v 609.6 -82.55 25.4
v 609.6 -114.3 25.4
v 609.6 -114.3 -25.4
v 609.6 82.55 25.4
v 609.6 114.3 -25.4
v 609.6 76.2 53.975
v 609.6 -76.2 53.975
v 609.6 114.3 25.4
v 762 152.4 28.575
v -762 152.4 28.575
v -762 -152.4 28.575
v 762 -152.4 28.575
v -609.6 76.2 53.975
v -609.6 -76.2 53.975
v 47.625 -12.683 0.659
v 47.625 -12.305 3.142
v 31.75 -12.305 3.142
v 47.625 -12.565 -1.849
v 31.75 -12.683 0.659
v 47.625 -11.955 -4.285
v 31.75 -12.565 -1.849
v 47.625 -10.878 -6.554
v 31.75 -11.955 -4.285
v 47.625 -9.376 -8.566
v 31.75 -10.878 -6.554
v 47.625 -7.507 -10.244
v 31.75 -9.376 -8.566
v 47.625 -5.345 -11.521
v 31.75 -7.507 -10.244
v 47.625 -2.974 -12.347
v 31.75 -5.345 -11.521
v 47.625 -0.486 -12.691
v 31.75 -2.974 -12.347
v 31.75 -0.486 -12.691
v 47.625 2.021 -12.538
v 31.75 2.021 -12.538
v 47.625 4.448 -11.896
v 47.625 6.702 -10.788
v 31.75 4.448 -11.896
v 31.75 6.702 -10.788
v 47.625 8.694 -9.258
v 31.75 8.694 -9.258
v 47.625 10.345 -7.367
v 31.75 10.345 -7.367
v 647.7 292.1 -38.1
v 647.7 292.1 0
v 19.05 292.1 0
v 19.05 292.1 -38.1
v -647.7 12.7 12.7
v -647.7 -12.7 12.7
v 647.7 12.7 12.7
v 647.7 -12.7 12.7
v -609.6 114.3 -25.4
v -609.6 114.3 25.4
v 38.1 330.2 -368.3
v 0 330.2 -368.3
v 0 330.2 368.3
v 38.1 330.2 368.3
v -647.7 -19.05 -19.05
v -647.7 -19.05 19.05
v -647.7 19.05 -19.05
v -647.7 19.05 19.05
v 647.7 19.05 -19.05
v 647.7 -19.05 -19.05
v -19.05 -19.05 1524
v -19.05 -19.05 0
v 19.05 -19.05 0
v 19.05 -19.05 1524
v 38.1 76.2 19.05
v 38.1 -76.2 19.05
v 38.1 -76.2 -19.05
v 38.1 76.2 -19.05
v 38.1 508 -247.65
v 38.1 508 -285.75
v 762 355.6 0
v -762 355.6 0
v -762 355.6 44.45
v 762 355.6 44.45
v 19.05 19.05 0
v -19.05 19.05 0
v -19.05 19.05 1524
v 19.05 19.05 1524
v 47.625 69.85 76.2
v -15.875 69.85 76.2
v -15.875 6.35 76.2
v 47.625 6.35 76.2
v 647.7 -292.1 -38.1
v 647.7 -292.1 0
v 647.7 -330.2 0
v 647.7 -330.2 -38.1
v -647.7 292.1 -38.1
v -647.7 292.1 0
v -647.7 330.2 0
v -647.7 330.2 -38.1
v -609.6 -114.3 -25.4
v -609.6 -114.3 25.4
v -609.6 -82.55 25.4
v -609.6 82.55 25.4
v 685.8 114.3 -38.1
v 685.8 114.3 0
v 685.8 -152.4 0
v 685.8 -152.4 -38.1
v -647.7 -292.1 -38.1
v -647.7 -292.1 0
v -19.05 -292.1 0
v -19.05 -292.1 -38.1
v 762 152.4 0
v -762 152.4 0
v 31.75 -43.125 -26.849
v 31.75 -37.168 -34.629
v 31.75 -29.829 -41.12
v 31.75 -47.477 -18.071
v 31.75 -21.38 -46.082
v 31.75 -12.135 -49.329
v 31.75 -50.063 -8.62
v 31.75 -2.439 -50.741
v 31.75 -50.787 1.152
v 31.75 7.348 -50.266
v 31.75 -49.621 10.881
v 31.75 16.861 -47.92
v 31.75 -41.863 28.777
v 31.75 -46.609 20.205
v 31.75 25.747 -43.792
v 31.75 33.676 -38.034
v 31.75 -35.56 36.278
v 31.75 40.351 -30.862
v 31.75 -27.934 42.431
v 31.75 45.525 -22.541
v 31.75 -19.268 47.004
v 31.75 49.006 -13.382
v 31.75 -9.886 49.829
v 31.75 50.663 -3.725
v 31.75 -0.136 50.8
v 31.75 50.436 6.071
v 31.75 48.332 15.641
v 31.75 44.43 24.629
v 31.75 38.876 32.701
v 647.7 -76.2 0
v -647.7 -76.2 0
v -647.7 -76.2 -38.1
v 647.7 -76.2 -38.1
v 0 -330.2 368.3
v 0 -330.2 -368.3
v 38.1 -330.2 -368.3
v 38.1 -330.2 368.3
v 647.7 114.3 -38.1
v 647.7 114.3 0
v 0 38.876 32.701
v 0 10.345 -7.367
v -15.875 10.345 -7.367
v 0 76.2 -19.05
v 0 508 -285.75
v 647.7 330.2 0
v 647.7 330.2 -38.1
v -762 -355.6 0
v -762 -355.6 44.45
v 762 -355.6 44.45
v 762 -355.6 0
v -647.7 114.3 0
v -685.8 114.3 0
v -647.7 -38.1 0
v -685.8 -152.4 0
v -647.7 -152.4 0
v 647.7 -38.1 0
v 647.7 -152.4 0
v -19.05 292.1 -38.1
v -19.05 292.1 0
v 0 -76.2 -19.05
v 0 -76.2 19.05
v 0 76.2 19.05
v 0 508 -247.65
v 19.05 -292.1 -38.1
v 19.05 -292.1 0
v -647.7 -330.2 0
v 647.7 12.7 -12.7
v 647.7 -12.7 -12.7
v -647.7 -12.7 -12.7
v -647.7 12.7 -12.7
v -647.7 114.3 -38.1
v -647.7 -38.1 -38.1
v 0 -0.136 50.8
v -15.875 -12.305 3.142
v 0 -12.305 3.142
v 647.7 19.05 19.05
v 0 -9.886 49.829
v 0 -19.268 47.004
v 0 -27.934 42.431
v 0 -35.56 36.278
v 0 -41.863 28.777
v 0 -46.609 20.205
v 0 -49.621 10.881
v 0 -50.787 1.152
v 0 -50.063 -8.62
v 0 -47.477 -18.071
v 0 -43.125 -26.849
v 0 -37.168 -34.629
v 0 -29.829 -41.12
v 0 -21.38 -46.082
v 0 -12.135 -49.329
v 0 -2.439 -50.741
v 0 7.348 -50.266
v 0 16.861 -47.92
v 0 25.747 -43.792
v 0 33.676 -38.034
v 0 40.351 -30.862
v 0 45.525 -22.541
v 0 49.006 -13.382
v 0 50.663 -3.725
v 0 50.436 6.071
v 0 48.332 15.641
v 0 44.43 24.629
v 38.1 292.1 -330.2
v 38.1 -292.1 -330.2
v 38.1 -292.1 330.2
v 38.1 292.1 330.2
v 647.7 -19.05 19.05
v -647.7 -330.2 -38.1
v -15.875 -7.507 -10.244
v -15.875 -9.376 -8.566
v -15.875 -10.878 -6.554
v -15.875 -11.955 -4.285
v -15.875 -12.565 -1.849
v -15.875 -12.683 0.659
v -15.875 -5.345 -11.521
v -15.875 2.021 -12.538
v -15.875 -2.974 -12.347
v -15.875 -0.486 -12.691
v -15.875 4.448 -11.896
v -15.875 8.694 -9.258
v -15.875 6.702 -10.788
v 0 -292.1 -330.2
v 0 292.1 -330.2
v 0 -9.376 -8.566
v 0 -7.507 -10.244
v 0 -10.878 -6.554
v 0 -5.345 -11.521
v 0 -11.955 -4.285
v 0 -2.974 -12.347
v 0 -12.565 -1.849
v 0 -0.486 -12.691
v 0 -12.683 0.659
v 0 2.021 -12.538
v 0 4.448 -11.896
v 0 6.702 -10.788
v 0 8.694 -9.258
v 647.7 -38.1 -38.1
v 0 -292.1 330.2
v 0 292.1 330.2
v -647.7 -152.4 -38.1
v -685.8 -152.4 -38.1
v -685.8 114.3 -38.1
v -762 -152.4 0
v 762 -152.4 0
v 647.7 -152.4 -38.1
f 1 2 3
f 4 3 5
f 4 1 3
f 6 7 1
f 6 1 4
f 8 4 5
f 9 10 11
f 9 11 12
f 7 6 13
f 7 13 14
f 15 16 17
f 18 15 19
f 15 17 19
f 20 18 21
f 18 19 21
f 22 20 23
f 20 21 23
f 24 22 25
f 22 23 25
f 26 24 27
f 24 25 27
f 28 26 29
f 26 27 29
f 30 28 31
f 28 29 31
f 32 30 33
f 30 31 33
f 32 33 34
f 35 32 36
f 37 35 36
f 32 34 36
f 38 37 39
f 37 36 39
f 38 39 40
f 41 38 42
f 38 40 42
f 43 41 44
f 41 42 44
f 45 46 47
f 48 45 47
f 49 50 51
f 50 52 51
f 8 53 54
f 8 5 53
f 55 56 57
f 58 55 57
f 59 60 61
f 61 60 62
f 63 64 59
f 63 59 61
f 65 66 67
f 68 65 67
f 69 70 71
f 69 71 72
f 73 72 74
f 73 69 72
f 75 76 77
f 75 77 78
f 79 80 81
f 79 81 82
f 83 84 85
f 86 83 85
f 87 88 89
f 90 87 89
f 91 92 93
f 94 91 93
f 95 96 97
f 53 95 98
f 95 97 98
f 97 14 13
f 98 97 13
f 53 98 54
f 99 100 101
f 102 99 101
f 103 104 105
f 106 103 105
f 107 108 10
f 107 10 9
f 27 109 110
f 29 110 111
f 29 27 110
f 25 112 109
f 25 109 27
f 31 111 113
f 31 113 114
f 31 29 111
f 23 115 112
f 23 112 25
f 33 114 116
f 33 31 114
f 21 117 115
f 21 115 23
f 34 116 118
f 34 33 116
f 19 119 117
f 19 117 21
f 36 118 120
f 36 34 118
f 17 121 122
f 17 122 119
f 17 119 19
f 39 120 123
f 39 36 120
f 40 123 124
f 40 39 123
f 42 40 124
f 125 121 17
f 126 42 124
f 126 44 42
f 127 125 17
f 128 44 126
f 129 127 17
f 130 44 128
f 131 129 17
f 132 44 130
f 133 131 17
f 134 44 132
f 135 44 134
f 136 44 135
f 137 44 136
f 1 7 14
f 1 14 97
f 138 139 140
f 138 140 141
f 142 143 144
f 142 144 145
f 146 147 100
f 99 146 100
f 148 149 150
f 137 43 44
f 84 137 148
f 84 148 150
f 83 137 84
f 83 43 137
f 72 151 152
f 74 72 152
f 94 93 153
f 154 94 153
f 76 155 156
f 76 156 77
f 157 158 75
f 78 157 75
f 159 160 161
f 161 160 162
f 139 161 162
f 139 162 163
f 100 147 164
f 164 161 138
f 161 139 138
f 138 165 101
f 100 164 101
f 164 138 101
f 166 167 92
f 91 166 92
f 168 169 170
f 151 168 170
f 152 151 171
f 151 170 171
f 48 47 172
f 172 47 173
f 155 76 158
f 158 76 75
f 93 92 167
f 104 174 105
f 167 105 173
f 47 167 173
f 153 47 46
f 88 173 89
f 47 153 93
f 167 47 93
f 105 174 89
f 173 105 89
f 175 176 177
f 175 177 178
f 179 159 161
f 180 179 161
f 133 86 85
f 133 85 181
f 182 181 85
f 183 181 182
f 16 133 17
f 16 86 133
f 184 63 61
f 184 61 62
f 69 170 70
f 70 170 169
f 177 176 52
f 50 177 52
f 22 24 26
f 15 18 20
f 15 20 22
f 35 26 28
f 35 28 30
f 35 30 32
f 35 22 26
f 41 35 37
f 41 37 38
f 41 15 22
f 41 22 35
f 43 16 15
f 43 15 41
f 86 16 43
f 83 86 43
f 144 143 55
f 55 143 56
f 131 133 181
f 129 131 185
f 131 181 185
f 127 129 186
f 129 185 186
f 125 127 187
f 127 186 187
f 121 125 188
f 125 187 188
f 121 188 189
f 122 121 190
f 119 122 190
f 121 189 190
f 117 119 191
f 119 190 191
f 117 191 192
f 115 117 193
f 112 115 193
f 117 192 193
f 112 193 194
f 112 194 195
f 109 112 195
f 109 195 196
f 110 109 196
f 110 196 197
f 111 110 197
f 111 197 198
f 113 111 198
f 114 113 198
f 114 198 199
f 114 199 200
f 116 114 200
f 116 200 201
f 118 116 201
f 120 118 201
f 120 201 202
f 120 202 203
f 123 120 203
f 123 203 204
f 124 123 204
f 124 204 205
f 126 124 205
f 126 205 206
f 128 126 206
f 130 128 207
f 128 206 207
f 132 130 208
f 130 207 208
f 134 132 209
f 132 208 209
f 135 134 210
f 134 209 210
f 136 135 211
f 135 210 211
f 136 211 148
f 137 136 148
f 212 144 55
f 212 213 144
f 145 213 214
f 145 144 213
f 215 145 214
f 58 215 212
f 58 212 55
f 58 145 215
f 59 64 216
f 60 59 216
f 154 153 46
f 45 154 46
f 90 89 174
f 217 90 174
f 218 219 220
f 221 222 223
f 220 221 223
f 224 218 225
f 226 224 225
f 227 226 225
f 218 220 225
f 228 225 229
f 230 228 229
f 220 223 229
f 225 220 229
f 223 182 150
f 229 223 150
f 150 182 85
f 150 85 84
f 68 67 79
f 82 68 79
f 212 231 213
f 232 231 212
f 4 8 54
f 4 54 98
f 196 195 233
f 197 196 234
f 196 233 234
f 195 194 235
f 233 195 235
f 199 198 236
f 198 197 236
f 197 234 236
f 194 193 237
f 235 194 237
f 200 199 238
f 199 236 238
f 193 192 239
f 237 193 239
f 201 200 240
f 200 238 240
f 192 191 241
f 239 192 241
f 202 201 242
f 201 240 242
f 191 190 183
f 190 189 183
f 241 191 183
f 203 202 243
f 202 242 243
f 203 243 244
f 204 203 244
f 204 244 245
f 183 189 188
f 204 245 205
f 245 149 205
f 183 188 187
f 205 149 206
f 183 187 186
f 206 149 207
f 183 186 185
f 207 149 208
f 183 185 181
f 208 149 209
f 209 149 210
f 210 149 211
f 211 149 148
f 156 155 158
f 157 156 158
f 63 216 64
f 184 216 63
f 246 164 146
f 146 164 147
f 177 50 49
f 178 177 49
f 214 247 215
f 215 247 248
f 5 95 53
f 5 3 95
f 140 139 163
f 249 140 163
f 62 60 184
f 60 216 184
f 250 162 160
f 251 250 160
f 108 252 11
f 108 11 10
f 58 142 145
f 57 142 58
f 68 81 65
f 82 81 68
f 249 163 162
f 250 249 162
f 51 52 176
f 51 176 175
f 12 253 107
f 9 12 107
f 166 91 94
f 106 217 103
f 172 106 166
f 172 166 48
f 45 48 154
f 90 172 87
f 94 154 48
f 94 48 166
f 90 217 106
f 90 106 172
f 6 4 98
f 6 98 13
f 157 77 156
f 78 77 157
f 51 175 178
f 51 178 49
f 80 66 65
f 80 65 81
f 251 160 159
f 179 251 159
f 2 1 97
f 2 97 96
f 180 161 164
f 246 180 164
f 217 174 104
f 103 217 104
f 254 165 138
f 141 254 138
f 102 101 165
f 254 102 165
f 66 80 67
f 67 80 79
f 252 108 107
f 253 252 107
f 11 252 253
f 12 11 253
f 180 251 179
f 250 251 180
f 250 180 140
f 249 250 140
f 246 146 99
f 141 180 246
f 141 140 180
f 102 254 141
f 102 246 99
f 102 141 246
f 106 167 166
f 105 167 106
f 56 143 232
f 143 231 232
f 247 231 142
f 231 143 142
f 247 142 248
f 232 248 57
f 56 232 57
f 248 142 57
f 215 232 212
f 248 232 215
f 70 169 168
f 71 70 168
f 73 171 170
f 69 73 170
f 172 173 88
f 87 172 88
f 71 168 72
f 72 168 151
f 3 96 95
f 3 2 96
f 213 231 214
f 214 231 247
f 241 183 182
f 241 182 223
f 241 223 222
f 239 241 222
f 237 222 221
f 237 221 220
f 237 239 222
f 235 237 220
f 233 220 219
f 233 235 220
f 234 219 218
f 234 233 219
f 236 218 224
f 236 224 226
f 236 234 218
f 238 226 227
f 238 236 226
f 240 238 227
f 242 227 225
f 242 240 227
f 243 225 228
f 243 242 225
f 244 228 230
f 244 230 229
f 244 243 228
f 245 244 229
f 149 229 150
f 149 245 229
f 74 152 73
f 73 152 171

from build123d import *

# Parameters (mm, degrees)
F0_W           = 1524
F0_H           = 711.2
F1_DEPTH       = 44.45
F2_W           = 38.1
F2_H           = 584.2
F3_DEPTH       = 38.1
F4_W           = 660.4
F4_H           = 736.6
F4_W_2         = 584.2
F4_H_2         = 660.4
F5_DEPTH       = 38.1
F6_W           = 38.1
F6_H           = 38.1
F7_DEPTH       = 647.7
F8_W           = 38.1
F8_H           = 38.1
F9_DEPTH       = 1524
F10_W          = 1524
F10_H          = 304.8
F11_DEPTH      = 28.575
F12_W          = 1295.4
F12_H          = 38.1
F13_DEPTH      = 38.1
F15_DEPTH      = 38.1
F16_W          = 25.4
F16_H          = 25.4
F17_DEPTH      = 647.7
F19_DEPTH      = 609.6
F20_R          = 50.8
F21_DEPTH      = 31.75
F23_DEPTH      = 47.625
F23_DEPTH_BACK = 15.875


with BuildPart() as f1:
    # F0 (on Top) → F1 (new body)
    with BuildSketch(Plane.XY):
        Rectangle(F0_W, F0_H)
    extrude(amount=F1_DEPTH)


with BuildPart() as f3:
    # F2 (on face) → F3 (new body)
    with BuildSketch(Plane(origin=(0, 0, 0), x_dir=(1, 0, 0), z_dir=(0, 0, -1))):
        Rectangle(F2_W, F2_H)
        Polygon((647.7, -292.1), (19.05, -292.1), (-19.05, -292.1), (-647.7, -292.1), (-647.7, -330.2), (647.7, -330.2), align=None)
        Polygon((-19.05, 292.1), (19.05, 292.1), (647.7, 292.1), (647.7, 330.2), (-647.7, 330.2), (-647.7, 292.1), align=None)
    extrude(amount=F3_DEPTH)


with BuildPart() as f5:
    # F4 (on Right) → F5 (new body)
    with BuildSketch(Plane.YZ):
        Rectangle(F4_W, F4_H)
        Rectangle(F4_W_2, F4_H_2, mode=Mode.SUBTRACT)
    extrude(amount=F5_DEPTH)


with BuildPart() as f7:
    # F6 (on Right) → F7 (new body, symmetric)
    with BuildSketch(Plane.YZ):
        Rectangle(F6_W, F6_H)
    extrude(amount=F7_DEPTH, both=True)


with BuildPart() as f9:
    # F8 (on Top) → F9 (new body)
    with BuildSketch(Plane.XY):
        Rectangle(F8_W, F8_H)
    extrude(amount=F9_DEPTH)


with BuildPart() as f11:
    # F10 (on Top) → F11 (new body)
    with BuildSketch(Plane.XY):
        Rectangle(F10_W, F10_H)
    extrude(amount=F11_DEPTH)


with BuildPart() as f13:
    # F12 (on face) → F13 (new body)
    with BuildSketch(Plane(origin=(0, 0, 0), x_dir=(1, 0, 0), z_dir=(0, 0, -1))):
        Polygon((-647.7, 38.1), (-647.7, 76.2), (-647.7, 152.4), (-685.8, 152.4), (-685.8, -114.3), (-647.7, -114.3), align=None)
        Polygon((647.7, 152.4), (647.7, 76.2), (647.7, 38.1), (647.7, -114.3), (685.8, -114.3), (685.8, 152.4), align=None)
        with Locations((0, 57.15)):
            Rectangle(F12_W, F12_H)
    extrude(amount=F13_DEPTH)


with BuildPart() as f15:
    # F14 (on Right) → F15 (new body)
    with BuildSketch(Plane.YZ):
        Polygon((76.2, 19.05), (-76.2, 19.05), (-76.2, -19.05), (76.2, -19.05), (508, -285.75), (508, -247.65), align=None)
    extrude(amount=F15_DEPTH)


with BuildPart() as f17:
    # F16 (on Right) → F17 (new body, symmetric)
    with BuildSketch(Plane.YZ):
        Rectangle(F16_W, F16_H)
    extrude(amount=F17_DEPTH, both=True)


with BuildPart() as f19:
    # F18 (on Right) → F19 (new body, symmetric)
    with BuildSketch(Plane.YZ):
        Polygon((114.3, -25.4), (114.3, 25.4), (82.55, 25.4), (76.2, 53.975), (0, 53.975), (-76.2, 53.975), (-82.55, 25.4), (-114.3, 25.4), (-114.3, -25.4), align=None)
    extrude(amount=F19_DEPTH, both=True)


with BuildPart() as f21:
    # F20 (on Right) → F21 (new body)
    with BuildSketch(Plane.YZ):
        Circle(F20_R)
    extrude(amount=F21_DEPTH)

    # F22 (on Right) → F23 (join, two sides)
    with BuildSketch(Plane.YZ) as f23_sk:
        with BuildLine():
            Line((69.85, 76.2), (38.1, 76.2))
            Line((38.1, 76.2), (6.35, 76.2))
            Line((6.35, 76.2), (-12.3051705798, 3.1420975483))
            ThreePointArc((-12.3051705798, 3.1420975483), (-5.3449000573, -11.5205053439), (10.3452730182, -7.3665002667))
            Line((10.3452730182, -7.3665002667), (69.85, 76.2))
        make_face()
    extrude(amount=F23_DEPTH)
    extrude(f23_sk.sketch, amount=-F23_DEPTH_BACK)


solid = Compound([f1.part, f3.part, f5.part, f7.part, f9.part, f11.part, f13.part, f15.part, f17.part, f19.part, f21.part])
